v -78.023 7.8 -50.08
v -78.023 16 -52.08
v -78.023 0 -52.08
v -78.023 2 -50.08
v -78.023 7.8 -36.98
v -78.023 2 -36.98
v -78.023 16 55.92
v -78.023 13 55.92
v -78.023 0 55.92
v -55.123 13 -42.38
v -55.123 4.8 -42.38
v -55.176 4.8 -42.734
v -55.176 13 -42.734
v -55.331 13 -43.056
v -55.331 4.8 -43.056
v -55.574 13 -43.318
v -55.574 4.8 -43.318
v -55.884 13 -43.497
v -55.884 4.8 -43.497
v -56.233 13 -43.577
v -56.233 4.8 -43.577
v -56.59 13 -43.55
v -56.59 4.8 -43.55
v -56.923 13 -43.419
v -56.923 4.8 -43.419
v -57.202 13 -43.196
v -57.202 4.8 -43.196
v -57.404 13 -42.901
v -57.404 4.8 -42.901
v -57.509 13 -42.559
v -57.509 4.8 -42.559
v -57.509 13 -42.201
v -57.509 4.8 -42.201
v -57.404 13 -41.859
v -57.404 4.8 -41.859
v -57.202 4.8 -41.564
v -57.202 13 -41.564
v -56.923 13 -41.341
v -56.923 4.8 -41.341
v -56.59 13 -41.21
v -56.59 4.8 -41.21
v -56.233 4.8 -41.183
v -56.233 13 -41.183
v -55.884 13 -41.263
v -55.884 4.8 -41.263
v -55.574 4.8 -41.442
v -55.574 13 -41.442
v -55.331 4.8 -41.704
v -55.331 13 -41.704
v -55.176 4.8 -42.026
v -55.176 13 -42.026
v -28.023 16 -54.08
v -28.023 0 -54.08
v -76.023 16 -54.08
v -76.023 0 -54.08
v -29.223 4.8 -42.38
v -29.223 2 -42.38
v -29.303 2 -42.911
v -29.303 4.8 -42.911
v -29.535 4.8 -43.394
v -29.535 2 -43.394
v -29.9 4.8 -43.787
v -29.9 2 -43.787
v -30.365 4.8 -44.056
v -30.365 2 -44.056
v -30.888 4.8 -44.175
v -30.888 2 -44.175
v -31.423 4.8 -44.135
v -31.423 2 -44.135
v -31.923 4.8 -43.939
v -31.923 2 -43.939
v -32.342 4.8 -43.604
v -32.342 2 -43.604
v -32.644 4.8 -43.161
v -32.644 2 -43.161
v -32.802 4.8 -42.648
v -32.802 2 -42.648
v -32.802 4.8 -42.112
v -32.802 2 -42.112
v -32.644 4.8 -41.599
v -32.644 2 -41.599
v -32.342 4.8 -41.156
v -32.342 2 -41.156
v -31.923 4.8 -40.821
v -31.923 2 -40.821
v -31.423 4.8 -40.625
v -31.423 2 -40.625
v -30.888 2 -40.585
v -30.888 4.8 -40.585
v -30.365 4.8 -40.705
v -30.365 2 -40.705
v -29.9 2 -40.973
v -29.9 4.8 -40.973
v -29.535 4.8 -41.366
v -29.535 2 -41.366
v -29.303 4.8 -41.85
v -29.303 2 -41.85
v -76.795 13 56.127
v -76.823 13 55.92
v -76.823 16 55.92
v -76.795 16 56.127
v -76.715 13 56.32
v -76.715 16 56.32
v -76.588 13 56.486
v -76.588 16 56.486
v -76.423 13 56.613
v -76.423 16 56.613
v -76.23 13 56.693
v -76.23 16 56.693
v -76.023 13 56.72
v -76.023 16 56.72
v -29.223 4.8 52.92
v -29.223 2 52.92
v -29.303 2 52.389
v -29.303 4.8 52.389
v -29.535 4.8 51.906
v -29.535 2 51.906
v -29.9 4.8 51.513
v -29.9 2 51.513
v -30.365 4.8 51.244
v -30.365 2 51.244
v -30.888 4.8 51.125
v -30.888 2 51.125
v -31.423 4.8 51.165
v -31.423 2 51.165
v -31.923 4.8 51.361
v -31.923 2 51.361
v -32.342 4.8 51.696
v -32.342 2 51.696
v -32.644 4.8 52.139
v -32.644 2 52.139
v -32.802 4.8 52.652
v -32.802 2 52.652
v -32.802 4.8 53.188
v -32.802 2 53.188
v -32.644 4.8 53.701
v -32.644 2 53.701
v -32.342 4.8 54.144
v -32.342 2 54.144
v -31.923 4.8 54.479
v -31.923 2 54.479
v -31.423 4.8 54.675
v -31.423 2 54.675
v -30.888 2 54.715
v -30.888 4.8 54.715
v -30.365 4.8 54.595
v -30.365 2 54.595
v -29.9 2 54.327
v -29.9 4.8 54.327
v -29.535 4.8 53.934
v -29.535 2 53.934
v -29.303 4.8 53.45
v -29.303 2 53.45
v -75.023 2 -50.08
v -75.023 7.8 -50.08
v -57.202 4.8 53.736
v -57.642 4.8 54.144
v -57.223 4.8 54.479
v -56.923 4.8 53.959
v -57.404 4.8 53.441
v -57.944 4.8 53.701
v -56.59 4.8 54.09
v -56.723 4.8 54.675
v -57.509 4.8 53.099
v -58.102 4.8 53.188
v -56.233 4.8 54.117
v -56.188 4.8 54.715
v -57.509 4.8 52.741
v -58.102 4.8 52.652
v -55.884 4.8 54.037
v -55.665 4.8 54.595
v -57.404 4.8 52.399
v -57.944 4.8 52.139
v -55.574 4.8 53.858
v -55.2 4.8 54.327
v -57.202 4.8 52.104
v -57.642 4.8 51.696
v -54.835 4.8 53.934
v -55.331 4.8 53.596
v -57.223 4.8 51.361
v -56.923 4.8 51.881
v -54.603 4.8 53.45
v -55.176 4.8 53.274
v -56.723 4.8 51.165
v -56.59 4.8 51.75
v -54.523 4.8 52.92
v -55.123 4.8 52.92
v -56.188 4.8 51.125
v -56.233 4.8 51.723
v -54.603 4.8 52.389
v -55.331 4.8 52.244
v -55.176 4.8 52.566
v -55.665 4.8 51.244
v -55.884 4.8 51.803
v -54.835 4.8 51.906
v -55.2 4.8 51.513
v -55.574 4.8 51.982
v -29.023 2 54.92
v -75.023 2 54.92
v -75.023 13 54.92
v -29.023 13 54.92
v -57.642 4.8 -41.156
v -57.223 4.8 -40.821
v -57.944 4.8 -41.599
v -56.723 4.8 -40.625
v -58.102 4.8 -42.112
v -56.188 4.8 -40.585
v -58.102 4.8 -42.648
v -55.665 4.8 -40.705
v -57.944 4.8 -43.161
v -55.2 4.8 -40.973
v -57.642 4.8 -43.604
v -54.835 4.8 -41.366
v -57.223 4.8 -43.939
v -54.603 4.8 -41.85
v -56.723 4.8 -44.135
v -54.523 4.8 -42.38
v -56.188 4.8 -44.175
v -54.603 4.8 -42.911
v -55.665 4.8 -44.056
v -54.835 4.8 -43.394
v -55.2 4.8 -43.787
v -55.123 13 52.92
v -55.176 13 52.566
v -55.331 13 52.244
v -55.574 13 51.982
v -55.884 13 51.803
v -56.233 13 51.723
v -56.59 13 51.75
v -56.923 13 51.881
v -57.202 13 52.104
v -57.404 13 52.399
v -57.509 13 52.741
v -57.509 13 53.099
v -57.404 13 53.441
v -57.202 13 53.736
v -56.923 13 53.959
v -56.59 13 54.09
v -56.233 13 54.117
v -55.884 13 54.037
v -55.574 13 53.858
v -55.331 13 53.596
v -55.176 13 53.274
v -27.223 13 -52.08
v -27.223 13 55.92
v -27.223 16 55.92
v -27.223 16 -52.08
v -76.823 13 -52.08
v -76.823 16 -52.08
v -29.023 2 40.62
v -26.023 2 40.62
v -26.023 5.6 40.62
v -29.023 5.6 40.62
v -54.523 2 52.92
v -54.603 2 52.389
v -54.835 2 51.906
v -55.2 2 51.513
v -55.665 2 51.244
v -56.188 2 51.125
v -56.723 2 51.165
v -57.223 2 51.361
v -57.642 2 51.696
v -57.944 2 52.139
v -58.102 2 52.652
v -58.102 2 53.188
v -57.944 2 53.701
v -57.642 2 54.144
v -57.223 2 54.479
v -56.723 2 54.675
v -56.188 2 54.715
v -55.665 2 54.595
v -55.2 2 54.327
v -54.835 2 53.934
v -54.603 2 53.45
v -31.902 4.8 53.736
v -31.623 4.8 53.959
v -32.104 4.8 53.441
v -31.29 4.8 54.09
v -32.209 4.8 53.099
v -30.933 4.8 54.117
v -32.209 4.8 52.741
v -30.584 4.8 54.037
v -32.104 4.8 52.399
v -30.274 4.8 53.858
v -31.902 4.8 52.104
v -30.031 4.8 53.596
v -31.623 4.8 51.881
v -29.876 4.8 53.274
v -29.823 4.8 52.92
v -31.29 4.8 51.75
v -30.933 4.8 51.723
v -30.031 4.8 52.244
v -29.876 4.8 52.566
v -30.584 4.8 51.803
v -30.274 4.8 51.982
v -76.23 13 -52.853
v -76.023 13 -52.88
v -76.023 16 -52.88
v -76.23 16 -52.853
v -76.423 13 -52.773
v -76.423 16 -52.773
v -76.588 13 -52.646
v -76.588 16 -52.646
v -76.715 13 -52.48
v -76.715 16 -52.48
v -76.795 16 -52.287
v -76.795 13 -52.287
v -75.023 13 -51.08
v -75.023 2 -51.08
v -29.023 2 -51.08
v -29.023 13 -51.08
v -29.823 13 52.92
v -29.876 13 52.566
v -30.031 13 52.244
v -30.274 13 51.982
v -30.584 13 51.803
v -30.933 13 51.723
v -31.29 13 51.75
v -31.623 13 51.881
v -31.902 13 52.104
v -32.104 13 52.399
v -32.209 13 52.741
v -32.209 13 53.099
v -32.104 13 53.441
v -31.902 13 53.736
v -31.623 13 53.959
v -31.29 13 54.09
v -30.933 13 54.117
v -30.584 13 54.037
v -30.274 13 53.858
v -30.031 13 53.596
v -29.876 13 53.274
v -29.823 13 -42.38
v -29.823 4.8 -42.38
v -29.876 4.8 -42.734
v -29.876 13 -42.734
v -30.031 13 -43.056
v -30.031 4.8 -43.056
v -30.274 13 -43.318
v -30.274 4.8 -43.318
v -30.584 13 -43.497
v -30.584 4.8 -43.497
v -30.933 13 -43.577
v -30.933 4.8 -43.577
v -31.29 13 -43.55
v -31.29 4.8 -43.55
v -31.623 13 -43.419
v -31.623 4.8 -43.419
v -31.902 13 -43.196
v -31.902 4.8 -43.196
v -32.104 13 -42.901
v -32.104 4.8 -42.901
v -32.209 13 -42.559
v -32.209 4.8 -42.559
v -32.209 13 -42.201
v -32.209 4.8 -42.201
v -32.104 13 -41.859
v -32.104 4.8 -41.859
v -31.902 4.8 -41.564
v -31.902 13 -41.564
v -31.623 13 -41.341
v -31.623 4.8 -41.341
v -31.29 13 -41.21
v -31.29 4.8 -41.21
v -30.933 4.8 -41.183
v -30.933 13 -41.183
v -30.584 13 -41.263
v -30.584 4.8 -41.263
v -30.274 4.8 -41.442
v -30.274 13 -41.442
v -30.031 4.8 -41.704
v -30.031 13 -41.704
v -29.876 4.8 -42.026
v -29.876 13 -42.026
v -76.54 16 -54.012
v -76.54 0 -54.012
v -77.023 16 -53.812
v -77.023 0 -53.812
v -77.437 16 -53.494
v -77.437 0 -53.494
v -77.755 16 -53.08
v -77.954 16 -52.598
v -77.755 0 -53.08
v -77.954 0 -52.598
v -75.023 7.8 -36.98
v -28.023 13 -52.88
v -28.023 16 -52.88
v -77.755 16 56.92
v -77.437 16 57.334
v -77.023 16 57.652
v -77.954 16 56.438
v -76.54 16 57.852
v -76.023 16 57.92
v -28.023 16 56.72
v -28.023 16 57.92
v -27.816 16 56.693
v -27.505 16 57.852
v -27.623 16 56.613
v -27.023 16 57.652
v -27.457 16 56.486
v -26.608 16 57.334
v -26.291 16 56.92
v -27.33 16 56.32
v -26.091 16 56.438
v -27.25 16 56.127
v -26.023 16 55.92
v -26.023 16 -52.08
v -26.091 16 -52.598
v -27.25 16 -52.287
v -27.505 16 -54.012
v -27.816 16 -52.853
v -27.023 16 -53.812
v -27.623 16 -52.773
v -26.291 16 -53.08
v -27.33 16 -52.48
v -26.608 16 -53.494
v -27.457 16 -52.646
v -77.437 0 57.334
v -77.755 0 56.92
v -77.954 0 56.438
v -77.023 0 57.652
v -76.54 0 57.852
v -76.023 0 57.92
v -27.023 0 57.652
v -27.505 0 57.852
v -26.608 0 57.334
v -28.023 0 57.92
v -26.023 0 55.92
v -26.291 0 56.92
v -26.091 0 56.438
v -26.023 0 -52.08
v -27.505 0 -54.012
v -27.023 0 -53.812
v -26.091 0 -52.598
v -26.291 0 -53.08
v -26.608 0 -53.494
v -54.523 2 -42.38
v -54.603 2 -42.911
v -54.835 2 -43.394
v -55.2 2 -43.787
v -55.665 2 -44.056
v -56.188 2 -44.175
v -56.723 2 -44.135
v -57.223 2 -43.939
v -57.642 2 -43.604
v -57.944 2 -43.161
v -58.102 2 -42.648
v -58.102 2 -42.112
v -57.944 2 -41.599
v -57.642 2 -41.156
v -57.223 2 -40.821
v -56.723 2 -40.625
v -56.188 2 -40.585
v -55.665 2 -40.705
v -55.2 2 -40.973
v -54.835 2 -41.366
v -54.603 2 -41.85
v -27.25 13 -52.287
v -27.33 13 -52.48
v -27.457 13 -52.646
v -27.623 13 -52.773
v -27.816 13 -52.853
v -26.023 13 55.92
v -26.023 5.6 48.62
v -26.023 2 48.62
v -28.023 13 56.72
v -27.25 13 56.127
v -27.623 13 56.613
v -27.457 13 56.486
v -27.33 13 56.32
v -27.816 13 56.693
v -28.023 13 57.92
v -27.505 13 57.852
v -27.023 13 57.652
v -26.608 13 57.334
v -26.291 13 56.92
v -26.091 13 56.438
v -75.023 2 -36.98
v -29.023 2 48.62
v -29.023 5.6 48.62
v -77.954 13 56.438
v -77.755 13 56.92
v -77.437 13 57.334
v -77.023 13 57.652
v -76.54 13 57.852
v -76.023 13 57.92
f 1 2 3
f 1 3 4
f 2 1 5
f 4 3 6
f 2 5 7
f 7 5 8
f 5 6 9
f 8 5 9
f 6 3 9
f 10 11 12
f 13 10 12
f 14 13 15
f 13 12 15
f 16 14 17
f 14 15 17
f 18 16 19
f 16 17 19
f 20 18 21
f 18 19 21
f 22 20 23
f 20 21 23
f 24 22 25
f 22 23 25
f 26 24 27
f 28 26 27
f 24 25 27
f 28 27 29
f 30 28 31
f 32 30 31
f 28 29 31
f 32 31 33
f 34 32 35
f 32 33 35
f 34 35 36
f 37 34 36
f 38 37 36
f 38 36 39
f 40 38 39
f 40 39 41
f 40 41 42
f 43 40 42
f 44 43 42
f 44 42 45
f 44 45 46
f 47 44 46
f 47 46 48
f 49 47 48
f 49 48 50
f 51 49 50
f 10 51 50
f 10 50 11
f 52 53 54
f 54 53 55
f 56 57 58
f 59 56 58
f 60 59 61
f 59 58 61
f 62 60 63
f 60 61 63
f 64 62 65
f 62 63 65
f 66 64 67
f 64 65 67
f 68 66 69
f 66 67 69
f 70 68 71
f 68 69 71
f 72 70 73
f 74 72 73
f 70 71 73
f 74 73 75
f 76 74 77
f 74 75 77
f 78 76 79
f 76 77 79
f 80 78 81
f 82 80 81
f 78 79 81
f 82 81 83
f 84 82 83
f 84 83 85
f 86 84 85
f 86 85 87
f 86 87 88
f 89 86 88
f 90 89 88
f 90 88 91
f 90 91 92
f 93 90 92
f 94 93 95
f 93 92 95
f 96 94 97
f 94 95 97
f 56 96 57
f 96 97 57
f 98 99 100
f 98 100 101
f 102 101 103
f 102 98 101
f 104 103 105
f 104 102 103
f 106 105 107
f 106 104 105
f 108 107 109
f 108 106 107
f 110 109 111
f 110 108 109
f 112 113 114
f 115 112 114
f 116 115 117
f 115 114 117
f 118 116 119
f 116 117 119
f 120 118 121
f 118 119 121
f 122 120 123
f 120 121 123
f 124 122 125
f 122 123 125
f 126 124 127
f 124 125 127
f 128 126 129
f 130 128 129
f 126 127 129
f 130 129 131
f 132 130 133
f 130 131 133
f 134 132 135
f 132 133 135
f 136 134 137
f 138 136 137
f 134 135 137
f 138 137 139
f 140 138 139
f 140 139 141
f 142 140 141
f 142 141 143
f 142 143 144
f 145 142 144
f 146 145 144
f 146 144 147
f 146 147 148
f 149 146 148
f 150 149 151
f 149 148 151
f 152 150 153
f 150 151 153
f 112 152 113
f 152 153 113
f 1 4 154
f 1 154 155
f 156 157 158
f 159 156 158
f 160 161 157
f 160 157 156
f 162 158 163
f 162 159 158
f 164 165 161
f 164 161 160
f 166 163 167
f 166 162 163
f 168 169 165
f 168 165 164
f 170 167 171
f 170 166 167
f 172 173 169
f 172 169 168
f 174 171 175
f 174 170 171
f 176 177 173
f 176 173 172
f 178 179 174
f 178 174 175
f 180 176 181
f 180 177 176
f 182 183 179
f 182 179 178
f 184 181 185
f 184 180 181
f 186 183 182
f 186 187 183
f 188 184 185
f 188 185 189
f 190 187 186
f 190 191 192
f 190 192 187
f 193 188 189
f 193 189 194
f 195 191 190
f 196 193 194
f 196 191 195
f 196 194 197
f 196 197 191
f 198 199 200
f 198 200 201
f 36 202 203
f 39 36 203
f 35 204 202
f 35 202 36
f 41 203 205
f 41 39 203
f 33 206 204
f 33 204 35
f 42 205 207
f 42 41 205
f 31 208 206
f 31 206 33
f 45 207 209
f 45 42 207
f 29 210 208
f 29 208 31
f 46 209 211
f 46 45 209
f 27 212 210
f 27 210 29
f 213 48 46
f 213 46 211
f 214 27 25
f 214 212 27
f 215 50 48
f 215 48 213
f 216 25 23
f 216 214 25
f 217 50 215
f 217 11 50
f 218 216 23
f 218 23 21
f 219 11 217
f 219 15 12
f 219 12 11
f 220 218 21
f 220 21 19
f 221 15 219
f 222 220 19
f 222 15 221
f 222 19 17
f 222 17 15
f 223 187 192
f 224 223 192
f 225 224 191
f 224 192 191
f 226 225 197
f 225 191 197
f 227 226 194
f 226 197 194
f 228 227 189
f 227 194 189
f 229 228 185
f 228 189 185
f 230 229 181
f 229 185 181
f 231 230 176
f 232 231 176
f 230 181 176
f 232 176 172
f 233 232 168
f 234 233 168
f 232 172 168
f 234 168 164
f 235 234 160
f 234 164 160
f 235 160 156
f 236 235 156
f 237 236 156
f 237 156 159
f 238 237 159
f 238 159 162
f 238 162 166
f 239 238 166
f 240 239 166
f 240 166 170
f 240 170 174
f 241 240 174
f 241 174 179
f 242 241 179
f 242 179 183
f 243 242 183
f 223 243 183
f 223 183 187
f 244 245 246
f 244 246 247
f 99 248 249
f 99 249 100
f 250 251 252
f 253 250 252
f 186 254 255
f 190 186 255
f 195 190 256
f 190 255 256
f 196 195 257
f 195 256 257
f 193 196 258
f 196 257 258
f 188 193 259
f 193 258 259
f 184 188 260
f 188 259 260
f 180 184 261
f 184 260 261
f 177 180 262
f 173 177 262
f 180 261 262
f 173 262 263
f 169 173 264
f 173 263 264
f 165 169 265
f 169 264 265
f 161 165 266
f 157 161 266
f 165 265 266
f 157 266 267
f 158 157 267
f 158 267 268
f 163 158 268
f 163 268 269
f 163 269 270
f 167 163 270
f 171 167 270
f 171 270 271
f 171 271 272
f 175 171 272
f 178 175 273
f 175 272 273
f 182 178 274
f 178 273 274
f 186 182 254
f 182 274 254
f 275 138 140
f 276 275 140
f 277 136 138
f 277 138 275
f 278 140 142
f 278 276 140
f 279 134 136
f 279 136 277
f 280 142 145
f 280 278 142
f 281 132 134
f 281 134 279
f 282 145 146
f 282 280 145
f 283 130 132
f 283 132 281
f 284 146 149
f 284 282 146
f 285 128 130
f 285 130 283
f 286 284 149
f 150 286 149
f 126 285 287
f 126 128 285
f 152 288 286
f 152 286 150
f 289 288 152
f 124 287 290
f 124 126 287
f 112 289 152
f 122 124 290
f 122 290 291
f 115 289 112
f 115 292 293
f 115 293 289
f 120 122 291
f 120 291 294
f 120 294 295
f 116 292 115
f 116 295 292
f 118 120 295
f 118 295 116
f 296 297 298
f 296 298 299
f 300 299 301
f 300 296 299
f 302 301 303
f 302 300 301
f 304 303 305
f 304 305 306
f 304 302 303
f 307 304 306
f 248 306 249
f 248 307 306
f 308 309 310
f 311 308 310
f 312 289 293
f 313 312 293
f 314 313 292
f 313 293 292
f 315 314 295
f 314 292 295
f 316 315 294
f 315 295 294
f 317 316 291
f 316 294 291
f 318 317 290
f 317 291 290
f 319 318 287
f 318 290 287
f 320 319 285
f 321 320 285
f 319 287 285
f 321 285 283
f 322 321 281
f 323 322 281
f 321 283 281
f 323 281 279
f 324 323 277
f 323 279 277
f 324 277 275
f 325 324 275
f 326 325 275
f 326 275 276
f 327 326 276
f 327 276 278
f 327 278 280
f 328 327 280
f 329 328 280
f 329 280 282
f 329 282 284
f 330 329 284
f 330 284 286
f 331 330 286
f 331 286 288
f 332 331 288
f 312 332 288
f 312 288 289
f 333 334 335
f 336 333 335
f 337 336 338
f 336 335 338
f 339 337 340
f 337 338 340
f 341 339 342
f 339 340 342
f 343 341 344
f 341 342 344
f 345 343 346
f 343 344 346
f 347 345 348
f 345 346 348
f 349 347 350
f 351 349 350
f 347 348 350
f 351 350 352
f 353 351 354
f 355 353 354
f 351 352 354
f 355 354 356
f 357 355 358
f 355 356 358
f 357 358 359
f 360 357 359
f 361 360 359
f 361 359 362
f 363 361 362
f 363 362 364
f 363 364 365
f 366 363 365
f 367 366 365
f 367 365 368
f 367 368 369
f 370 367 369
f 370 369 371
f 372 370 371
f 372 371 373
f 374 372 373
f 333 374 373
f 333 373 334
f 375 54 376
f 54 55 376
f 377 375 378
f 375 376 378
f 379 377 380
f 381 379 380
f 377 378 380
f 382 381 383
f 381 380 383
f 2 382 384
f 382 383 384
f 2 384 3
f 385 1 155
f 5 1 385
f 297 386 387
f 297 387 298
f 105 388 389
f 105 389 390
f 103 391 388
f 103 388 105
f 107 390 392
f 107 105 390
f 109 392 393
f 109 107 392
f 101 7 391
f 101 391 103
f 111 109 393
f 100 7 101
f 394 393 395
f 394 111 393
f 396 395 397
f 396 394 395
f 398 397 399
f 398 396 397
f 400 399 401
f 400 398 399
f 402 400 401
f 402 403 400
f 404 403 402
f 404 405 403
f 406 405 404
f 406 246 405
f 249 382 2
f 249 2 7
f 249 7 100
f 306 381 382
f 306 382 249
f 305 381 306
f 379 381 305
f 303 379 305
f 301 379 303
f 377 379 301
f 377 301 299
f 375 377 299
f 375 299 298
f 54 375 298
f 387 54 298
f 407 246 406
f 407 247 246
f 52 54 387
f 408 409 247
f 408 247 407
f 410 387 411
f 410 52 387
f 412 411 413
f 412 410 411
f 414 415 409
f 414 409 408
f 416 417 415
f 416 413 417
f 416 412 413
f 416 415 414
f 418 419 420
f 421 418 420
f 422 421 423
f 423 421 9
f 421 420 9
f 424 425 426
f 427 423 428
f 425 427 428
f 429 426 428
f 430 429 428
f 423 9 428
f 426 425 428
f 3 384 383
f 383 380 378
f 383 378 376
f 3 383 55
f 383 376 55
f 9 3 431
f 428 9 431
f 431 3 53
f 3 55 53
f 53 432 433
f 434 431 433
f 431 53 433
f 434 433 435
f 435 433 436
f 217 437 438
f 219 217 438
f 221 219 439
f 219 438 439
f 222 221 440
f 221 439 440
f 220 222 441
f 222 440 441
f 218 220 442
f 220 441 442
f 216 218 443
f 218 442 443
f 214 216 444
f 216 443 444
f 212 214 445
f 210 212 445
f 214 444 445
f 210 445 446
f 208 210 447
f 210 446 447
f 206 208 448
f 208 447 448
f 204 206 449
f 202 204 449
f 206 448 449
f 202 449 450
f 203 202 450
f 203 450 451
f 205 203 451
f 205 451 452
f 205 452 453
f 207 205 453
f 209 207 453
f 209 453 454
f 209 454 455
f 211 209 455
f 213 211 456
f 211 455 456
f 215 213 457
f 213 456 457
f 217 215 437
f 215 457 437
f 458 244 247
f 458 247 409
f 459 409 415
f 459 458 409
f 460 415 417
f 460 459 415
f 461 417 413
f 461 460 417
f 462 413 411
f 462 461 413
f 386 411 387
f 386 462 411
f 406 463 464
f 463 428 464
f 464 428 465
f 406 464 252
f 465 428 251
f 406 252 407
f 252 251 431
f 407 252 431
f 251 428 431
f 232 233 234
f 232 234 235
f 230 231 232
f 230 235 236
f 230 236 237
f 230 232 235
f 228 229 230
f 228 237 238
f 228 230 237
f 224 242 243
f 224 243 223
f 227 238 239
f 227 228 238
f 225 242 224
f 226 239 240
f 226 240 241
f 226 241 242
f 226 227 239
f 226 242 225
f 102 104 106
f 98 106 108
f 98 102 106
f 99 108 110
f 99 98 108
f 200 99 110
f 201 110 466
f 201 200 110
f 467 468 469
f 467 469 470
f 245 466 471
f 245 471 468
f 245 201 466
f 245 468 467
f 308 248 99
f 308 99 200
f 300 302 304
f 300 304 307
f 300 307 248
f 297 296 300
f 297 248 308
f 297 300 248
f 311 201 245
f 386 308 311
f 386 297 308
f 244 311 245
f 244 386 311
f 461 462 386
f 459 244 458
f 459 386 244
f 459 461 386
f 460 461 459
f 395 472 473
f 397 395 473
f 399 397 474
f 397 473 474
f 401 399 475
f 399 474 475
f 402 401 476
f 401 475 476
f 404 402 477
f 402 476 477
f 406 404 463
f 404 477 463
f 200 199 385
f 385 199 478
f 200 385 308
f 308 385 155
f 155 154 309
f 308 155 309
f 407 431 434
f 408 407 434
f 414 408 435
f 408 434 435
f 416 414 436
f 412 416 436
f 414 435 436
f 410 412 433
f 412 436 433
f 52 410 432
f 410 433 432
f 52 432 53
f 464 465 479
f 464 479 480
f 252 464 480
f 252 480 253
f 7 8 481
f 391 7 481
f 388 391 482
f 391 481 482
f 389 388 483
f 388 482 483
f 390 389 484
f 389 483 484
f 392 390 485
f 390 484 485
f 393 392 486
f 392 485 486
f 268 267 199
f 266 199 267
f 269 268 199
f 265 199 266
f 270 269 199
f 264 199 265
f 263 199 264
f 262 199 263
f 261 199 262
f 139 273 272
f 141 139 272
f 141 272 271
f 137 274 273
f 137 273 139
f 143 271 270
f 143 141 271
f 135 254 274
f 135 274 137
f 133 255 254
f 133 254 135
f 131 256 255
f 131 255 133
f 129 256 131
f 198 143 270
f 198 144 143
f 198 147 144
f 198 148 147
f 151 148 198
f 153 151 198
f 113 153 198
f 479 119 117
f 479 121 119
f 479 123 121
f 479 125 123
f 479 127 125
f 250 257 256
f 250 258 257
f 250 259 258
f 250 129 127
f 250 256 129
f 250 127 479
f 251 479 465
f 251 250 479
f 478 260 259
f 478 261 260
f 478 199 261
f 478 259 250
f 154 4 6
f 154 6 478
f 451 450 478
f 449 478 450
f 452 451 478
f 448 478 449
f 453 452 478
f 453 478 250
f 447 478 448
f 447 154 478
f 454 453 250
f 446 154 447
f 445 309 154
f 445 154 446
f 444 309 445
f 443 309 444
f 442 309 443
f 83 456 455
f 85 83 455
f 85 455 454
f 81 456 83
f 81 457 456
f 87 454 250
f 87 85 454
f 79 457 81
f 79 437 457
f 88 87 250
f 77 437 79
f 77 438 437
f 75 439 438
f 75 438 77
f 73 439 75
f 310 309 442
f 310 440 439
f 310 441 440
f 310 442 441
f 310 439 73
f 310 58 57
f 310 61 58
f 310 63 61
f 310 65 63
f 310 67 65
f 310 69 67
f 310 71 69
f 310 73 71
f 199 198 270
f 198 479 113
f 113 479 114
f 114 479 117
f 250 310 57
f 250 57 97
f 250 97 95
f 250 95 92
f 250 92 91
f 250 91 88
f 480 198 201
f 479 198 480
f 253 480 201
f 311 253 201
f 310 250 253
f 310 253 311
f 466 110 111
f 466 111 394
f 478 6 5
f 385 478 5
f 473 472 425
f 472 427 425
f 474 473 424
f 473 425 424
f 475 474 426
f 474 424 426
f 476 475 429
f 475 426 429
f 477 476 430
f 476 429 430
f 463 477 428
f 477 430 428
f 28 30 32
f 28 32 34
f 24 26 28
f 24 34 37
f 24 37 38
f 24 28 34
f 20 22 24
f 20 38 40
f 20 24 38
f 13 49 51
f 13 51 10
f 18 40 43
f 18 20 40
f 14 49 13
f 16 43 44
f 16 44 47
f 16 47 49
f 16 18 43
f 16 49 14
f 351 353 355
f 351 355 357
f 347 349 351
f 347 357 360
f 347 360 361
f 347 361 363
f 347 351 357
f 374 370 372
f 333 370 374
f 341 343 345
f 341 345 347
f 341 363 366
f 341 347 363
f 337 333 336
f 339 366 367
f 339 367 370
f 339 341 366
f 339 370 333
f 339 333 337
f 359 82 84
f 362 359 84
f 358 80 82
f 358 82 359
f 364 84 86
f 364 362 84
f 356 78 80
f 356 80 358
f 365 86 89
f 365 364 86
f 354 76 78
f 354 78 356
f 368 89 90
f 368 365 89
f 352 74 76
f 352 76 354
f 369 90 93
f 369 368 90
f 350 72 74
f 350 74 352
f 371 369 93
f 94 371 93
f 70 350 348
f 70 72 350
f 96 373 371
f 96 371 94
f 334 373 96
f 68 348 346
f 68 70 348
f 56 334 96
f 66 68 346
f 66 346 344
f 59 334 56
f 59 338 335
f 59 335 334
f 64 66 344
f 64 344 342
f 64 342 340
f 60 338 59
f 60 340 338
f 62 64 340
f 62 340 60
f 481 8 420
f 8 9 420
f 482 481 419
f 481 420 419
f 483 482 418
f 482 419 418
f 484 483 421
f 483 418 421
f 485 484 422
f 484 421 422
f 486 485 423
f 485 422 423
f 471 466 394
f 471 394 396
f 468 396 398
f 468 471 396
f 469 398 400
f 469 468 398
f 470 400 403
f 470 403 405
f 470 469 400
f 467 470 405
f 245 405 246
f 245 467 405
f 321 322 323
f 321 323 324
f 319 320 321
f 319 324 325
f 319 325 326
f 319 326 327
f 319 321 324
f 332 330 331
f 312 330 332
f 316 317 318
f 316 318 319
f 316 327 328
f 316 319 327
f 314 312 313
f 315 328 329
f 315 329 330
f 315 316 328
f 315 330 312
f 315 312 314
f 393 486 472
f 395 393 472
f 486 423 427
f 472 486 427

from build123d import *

# Parameters (mm, degrees)
SKETCH1_W           = 50
SKETCH1_H           = 110
BOSS_EXTRUDE1_DEPTH = 2
SKETCH2_W           = 50
SKETCH2_H           = 110
SKETCH2_W_2         = 46
SKETCH2_H_2         = 106
BOSS_EXTRUDE3_DEPTH = 11
SKETCH3_R           = 1.2
BOSS_EXTRUDE4_DEPTH = 11
SKETCH4_W           = 52
SKETCH4_H           = 112
SKETCH4_W_2         = 50
SKETCH4_H_2         = 110
EXTRUDE_THIN1_DEPTH = 13
FILLET2_R           = 2
EXTRUDE_THIN3_DEPTH = 3
SKETCH6_R           = 1.8
BOSS_EXTRUDE5_DEPTH = 2.8
SKETCH8_W           = 8
SKETCH8_H           = 3.6
CUT_EXTRUDE2_DEPTH  = 12.8
SKETCH11_W          = 13.1
SKETCH11_H          = 5.8
CUT_EXTRUDE5_DEPTH  = 3


with BuildPart() as part:
    # Sketch1 → Boss-Extrude1 (new body)
    with BuildSketch(Plane(origin=(0, 0, 0), x_dir=(1, 0, 0), z_dir=(0, 1, 0))):
        with Locations((-52.022587269, -1.919917864)):
            Rectangle(SKETCH1_W, SKETCH1_H)
    extrude(amount=BOSS_EXTRUDE1_DEPTH)

    # Sketch2 → Boss-Extrude3 (add)
    with BuildSketch(Plane(origin=(0, 2, 0), x_dir=(1, 0, 0), z_dir=(0, 1, 0))):
        with Locations((-52.022587269, -1.919917864)):
            Rectangle(SKETCH2_W, SKETCH2_H)
        with Locations((-52.022587269, -1.919917864)):
            Rectangle(SKETCH2_W_2, SKETCH2_H_2, mode=Mode.SUBTRACT)
    extrude(amount=BOSS_EXTRUDE3_DEPTH)

    # Sketch3 → Boss-Extrude4 (add)
    with BuildSketch(Plane(origin=(0, 2, 0), x_dir=(1, 0, 0), z_dir=(0, 1, 0))):
        with Locations((-31.022587269, 42.380082136)):
            Circle(SKETCH3_R)
        with Locations((-31.022587269, -52.919917864)):
            Circle(SKETCH3_R)
        with Locations((-56.322587269, 42.380082136)):
            Circle(SKETCH3_R)
        with Locations((-56.322587269, -52.919917864)):
            Circle(SKETCH3_R)
    extrude(amount=BOSS_EXTRUDE4_DEPTH)

    # Sketch4 → Extrude-Thin1 (add)
    with BuildSketch(Plane(origin=(0, 13, 0), x_dir=(1, 0, 0), z_dir=(0, 1, 0))):
        with Locations((-52.022587269, -1.919917864)):
            Rectangle(SKETCH4_W, SKETCH4_H)
        with Locations((-52.022587269, -1.919917864)):
            Rectangle(SKETCH4_W_2, SKETCH4_H_2, mode=Mode.SUBTRACT)
    extrude(amount=-EXTRUDE_THIN1_DEPTH)

    # Fillet2
    fillet2_edges = [part.edges().sort_by_distance(p)[0] for p in [
        (-26.022587269, 6.5, -54.080082136),
        (-26.022587269, 6.5, 57.919917864),
        (-78.022587269, 6.5, 57.919917864),
        (-78.022587269, 6.5, -54.080082136),
    ]]
    fillet(fillet2_edges, radius=FILLET2_R)

    # Sketch5 → Extrude-Thin3 (add)
    with BuildSketch(Plane(origin=(0, 13, 0), x_dir=(1, 0, 0), z_dir=(0, 1, 0))):
        with BuildLine():
            Line((-28.022587269, 54.080082136), (-76.022587269, 54.080082136))
            ThreePointArc((-76.022587269, 54.080082136), (-77.436800831, 53.494295698), (-78.022587269, 52.080082136))
            Line((-78.022587269, 52.080082136), (-78.022587269, -55.919917864))
            ThreePointArc((-78.022587269, -55.919917864), (-77.436800831, -57.334131427), (-76.022587269, -57.919917864))
            Line((-76.022587269, -57.919917864), (-28.022587269, -57.919917864))
            ThreePointArc((-28.022587269, -57.919917864), (-26.608373707, -57.334131427), (-26.022587269, -55.919917864))
            Line((-26.022587269, -55.919917864), (-26.022587269, 52.080082136))
            ThreePointArc((-26.022587269, 52.080082136), (-26.608373707, 53.494295698), (-28.022587269, 54.080082136))
        make_face()
        with BuildLine():
            Line((-28.022587269, 52.880082136), (-76.022587269, 52.880082136))
            ThreePointArc((-76.022587269, 52.880082136), (-76.588272694, 52.64576756), (-76.822587269, 52.080082136))
            Line((-76.822587269, 52.080082136), (-76.822587269, -55.919917864))
            ThreePointArc((-76.822587269, -55.919917864), (-76.588272694, -56.485603289), (-76.022587269, -56.719917864))
            Line((-76.022587269, -56.719917864), (-28.022587269, -56.719917864))
            ThreePointArc((-28.022587269, -56.719917864), (-27.456901844, -56.485603289), (-27.222587269, -55.919917864))
            Line((-27.222587269, -55.919917864), (-27.222587269, 52.080082136))
            ThreePointArc((-27.222587269, 52.080082136), (-27.456901844, 52.64576756), (-28.022587269, 52.880082136))
        make_face(mode=Mode.SUBTRACT)
    extrude(amount=EXTRUDE_THIN3_DEPTH)

    # Sketch6 → Boss-Extrude5 (add)
    with BuildSketch(Plane(origin=(0, 2, 0), x_dir=(1, 0, 0), z_dir=(0, 1, 0))):
        with Locations((-56.322587269, -52.919917864)):
            Circle(SKETCH6_R)
        with Locations((-31.022587269, -52.919917864)):
            Circle(SKETCH6_R)
        with Locations((-56.322587269, 42.380082136)):
            Circle(SKETCH6_R)
        with Locations((-31.022587269, 42.380082136)):
            Circle(SKETCH6_R)
    extrude(amount=BOSS_EXTRUDE5_DEPTH)

    # Sketch8 → Cut-Extrude2 (cut)
    with BuildSketch(Plane(origin=(-26.022587269, 0, 0), x_dir=(0, 0, -1), z_dir=(1, 0, 0))):
        with Locations((-44.619917864, 3.8)):
            Rectangle(SKETCH8_W, SKETCH8_H)
    extrude(amount=-CUT_EXTRUDE2_DEPTH, mode=Mode.SUBTRACT)

    # Sketch11 → Cut-Extrude5 (cut)
    with BuildSketch(Plane.ZY.offset(78.022587269)):
        with Locations((-43.530082136, 4.9)):
            Rectangle(SKETCH11_W, SKETCH11_H)
    extrude(amount=-CUT_EXTRUDE5_DEPTH, mode=Mode.SUBTRACT)


solid = part.part
